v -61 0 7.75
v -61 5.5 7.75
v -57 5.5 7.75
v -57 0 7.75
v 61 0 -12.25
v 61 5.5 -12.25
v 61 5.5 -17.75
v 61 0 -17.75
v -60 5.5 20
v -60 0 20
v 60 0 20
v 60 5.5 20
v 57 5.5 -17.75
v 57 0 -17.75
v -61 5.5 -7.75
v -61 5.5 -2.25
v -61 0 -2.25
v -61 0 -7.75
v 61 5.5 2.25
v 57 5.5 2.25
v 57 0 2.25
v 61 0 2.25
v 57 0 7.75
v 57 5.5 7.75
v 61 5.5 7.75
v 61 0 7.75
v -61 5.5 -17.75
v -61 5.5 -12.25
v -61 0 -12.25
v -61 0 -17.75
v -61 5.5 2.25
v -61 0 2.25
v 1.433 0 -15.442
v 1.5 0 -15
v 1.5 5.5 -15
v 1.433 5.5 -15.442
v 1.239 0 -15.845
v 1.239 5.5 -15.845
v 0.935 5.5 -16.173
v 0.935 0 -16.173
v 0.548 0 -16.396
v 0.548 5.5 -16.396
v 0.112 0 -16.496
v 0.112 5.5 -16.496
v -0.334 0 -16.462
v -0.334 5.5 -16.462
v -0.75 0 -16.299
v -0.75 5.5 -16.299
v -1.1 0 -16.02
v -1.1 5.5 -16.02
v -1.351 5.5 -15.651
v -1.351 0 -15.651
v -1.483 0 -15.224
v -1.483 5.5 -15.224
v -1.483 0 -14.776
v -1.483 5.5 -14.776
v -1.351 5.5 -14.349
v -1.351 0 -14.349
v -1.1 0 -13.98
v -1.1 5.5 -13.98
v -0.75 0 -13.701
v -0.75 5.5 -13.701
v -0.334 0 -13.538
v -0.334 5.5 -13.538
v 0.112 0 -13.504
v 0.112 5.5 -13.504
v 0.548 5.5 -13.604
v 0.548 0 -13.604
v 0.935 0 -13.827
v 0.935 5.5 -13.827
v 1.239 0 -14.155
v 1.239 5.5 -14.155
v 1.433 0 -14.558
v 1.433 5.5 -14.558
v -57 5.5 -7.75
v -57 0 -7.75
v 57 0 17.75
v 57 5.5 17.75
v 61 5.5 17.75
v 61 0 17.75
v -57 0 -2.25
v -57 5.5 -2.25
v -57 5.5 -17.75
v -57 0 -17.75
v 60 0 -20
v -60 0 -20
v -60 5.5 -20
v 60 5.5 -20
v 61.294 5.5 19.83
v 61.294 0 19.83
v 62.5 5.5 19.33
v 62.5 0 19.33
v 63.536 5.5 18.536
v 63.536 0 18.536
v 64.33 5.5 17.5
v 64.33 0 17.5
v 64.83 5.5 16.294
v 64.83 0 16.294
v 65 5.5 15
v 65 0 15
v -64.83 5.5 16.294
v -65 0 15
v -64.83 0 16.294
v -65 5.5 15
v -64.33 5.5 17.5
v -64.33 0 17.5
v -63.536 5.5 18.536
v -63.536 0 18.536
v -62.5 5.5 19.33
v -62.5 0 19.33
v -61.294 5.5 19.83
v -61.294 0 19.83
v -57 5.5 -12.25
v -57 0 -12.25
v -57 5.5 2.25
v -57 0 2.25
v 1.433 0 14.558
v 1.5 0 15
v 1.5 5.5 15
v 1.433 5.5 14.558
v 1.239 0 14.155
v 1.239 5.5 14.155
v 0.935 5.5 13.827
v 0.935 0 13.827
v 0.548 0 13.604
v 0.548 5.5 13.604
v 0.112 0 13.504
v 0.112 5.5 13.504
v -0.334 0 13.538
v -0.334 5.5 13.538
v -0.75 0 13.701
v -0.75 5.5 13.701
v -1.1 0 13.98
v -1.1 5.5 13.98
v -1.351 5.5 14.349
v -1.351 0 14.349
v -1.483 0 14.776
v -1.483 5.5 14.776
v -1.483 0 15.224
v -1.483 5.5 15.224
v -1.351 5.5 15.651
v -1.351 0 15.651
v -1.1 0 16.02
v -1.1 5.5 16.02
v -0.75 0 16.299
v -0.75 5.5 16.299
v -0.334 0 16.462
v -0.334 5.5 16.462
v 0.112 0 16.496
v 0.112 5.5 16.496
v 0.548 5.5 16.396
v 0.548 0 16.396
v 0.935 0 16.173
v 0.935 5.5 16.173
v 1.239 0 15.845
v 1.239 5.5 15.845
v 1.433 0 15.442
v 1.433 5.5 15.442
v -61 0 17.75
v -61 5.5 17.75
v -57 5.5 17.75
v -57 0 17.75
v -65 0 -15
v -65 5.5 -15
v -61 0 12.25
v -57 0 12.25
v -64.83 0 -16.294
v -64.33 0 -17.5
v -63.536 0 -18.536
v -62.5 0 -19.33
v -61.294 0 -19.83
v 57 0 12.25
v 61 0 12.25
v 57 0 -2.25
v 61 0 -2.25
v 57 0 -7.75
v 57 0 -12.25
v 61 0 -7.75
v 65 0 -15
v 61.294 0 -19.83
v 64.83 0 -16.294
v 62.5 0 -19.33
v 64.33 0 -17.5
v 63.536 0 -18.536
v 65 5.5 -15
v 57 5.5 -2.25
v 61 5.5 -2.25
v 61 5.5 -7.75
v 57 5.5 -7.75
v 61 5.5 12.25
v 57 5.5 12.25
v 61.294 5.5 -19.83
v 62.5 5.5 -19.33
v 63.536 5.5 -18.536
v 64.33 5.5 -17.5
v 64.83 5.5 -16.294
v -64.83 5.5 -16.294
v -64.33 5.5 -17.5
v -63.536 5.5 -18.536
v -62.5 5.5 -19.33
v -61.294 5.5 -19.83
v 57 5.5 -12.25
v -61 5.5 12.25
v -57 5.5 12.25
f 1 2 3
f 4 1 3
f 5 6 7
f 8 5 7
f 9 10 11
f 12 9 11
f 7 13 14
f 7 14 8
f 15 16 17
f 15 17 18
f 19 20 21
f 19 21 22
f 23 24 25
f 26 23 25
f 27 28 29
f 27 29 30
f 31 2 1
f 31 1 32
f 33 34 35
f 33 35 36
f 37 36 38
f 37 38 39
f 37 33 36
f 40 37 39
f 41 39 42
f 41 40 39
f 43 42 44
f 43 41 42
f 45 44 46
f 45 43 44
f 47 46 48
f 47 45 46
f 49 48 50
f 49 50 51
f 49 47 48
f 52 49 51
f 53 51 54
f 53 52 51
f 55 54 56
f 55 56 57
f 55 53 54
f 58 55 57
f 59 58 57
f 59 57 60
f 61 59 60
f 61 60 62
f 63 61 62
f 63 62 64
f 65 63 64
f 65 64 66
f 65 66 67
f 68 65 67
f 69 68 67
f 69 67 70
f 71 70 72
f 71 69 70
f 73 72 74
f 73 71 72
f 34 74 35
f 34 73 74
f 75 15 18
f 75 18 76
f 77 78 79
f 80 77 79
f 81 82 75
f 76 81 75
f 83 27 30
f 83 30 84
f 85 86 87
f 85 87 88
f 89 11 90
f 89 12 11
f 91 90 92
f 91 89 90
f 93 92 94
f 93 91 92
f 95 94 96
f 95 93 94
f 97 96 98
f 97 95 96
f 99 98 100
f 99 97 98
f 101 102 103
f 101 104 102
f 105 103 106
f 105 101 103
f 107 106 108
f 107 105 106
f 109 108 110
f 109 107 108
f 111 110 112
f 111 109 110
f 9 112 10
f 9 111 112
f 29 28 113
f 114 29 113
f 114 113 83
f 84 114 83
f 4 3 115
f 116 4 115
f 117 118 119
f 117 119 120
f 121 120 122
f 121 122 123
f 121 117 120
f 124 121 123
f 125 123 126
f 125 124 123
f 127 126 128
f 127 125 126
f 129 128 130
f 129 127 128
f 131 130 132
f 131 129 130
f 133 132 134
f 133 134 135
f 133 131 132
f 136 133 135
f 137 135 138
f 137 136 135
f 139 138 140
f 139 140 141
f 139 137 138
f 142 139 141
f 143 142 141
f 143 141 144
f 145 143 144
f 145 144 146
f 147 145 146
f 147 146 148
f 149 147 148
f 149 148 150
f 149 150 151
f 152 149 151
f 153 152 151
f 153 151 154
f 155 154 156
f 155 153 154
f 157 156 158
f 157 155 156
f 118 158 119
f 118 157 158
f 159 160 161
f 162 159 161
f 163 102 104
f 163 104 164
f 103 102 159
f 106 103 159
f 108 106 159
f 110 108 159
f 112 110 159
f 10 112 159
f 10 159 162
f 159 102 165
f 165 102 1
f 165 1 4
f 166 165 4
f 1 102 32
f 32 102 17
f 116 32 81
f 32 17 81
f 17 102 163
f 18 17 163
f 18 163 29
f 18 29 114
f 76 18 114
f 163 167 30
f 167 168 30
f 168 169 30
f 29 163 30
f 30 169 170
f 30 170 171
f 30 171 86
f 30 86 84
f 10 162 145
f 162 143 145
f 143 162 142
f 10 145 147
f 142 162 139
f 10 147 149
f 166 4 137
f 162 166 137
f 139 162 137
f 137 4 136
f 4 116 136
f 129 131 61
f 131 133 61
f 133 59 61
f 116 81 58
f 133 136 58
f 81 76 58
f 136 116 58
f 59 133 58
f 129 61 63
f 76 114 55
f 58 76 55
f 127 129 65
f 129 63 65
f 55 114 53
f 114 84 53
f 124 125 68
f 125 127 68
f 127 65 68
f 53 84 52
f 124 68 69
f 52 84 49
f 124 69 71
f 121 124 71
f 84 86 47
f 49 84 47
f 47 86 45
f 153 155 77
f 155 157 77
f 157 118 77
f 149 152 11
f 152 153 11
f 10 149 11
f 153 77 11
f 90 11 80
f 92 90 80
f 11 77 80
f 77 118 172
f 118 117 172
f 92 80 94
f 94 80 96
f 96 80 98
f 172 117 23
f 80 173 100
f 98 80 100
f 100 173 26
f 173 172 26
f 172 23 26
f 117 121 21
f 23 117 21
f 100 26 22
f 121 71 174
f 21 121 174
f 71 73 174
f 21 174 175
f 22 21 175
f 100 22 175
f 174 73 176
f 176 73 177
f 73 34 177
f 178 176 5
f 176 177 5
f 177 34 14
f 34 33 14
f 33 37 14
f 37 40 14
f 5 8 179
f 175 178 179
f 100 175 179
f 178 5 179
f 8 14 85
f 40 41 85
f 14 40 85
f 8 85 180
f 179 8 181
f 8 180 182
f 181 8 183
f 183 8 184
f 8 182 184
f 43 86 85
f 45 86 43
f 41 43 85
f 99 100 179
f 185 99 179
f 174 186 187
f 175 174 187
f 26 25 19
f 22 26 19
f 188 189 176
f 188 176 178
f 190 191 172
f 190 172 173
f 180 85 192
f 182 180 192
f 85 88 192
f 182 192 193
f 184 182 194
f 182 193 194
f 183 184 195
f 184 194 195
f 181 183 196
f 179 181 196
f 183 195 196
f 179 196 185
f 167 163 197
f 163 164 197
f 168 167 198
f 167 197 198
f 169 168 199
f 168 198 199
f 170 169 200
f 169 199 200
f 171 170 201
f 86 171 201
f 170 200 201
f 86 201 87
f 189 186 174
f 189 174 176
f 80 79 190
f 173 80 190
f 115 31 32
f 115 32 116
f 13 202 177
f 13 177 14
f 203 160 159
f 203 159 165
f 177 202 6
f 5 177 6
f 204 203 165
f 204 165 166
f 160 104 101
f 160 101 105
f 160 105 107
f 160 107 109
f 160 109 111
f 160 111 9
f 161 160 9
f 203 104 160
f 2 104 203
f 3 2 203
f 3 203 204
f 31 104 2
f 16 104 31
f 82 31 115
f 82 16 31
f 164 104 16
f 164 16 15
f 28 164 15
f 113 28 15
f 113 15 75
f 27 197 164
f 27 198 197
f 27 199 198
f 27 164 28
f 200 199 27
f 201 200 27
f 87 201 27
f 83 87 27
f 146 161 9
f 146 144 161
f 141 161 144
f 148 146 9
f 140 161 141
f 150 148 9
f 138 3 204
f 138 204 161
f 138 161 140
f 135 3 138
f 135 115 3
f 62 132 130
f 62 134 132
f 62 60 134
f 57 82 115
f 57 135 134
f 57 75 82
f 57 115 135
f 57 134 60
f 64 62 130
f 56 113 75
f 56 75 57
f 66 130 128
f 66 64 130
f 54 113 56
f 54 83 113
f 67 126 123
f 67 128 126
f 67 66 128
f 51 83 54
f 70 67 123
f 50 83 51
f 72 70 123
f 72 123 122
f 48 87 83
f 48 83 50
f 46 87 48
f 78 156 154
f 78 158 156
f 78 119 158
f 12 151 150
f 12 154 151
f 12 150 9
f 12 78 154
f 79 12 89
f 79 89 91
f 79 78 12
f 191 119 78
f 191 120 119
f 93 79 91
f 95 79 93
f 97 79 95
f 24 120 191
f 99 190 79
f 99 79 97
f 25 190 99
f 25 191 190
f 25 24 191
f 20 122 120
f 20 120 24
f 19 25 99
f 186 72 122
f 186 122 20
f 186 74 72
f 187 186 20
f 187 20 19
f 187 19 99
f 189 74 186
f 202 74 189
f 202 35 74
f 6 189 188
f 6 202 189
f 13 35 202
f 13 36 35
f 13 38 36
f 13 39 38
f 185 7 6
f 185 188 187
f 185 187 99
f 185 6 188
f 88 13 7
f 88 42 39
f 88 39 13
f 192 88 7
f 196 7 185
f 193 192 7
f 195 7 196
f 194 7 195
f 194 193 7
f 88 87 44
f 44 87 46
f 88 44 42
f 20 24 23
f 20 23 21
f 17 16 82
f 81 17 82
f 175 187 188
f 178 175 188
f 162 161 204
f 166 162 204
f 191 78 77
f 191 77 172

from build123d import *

# Parameters (mm, degrees)
SKETCH1_W           = 130
SKETCH1_H           = 40
SKETCH1_R           = 1.5
BOSS_EXTRUDE1_DEPTH = 5.5
SKETCH2_W           = 4
SKETCH2_H           = 5.5
CUT_EXTRUDE1_DEPTH  = 6.5
FILLET1_R           = 5


with BuildPart() as part:
    # Sketch1 → Boss-Extrude1 (new body)
    with BuildSketch(Plane(origin=(0, 0, 0), x_dir=(1, 0, 0), z_dir=(0, 1, 0))):
        Rectangle(SKETCH1_W, SKETCH1_H)
        with Locations((0, 15)):
            Circle(SKETCH1_R, mode=Mode.SUBTRACT)
        with Locations((0, -15)):
            Circle(SKETCH1_R, mode=Mode.SUBTRACT)
    extrude(amount=BOSS_EXTRUDE1_DEPTH)

    # Sketch2 → Cut-Extrude1 (cut, through all)
    with BuildSketch(Plane(origin=(0, 5.5, 0), x_dir=(1, 0, 0), z_dir=(0, 1, 0))):
        with Locations((-59, 5)):
            Rectangle(SKETCH2_W, SKETCH2_H)
        with Locations((-59, 15)):
            Rectangle(SKETCH2_W, SKETCH2_H)
        with Locations((-59, -5)):
            Rectangle(SKETCH2_W, SKETCH2_H)
        with Locations((-59, -15)):
            Rectangle(SKETCH2_W, SKETCH2_H)
        with Locations((59, -15)):
            Rectangle(SKETCH2_W, SKETCH2_H)
        with Locations((59, 15)):
            Rectangle(SKETCH2_W, SKETCH2_H)
        with Locations((59, -5)):
            Rectangle(SKETCH2_W, SKETCH2_H)
        with Locations((59, 5)):
            Rectangle(SKETCH2_W, SKETCH2_H)
    extrude(amount=-CUT_EXTRUDE1_DEPTH, mode=Mode.SUBTRACT)

    # Fillet1
    fillet1_edges = [part.edges().sort_by_distance(p)[0] for p in [
        (-65, 2.75, -20),
        (65, 2.75, -20),
        (65, 2.75, 20),
        (-65, 2.75, 20),
    ]]
    fillet(fillet1_edges, radius=FILLET1_R)


solid = part.part
